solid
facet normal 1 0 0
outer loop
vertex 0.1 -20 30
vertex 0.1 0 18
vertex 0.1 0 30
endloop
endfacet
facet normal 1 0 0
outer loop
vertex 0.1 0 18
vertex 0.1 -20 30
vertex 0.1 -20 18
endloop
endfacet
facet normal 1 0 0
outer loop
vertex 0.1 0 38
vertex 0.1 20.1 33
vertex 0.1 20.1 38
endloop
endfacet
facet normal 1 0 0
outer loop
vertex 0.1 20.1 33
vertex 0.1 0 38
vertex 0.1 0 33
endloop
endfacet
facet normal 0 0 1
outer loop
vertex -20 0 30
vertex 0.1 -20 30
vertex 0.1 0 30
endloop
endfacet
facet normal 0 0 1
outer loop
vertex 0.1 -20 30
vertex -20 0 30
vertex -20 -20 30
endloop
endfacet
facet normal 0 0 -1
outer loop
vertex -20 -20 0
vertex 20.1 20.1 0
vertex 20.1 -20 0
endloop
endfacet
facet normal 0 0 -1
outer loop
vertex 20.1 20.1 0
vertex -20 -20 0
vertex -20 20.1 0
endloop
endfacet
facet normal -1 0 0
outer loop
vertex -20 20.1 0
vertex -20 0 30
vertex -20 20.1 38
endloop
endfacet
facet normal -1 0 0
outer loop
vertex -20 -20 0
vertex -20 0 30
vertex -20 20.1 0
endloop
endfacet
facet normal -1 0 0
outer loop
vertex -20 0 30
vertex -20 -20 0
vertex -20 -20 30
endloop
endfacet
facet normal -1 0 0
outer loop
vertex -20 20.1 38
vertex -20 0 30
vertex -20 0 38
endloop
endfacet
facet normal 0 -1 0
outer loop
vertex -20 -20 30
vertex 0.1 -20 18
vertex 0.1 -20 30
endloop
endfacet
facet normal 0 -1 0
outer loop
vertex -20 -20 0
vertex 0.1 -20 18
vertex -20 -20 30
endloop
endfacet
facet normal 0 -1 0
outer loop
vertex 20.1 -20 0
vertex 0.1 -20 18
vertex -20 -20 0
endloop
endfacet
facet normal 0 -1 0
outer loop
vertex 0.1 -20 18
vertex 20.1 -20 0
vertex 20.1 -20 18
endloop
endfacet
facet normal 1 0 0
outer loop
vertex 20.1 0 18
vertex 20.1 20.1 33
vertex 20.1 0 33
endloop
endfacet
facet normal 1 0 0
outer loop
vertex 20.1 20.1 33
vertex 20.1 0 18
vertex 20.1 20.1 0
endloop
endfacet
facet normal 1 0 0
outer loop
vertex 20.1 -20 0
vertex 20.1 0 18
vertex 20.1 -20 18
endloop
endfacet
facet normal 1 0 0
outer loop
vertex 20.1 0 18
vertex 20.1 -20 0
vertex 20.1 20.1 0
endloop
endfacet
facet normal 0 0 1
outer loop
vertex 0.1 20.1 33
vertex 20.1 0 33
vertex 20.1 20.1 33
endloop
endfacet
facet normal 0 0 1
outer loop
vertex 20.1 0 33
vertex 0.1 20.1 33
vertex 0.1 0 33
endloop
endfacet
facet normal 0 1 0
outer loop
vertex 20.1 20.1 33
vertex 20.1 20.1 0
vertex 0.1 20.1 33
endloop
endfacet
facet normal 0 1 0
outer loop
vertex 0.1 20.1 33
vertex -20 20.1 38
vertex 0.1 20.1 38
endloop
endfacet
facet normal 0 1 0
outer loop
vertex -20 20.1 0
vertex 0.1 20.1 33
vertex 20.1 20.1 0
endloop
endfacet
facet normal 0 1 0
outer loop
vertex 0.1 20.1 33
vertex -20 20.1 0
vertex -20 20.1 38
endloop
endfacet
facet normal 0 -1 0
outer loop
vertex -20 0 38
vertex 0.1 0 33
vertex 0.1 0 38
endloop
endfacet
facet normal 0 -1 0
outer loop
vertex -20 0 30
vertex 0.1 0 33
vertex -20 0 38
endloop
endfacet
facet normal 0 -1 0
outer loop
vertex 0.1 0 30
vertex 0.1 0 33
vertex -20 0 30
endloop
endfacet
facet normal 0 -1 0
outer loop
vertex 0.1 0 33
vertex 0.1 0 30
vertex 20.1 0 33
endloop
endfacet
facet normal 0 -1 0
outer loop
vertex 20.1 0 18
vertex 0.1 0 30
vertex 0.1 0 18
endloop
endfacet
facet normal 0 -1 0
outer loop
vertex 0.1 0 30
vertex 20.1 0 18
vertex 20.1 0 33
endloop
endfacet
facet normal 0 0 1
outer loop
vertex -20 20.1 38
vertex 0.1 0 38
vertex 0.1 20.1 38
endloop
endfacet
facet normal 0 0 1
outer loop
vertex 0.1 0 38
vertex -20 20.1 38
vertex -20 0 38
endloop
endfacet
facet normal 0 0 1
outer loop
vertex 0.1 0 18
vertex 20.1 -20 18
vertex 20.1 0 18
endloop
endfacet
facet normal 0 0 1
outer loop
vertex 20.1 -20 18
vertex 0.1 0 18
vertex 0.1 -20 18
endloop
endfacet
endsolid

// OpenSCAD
translate([-20, -20, 0]) cube([20.1, 20.1, 30]);
translate([0, 0, 0]) cube([20.1, 20.1, 33]);
translate([-20, 0, 0]) cube([20.1, 20.1, 38]);
translate([0, -20, 0]) cube([20.1, 20.1, 18]);
